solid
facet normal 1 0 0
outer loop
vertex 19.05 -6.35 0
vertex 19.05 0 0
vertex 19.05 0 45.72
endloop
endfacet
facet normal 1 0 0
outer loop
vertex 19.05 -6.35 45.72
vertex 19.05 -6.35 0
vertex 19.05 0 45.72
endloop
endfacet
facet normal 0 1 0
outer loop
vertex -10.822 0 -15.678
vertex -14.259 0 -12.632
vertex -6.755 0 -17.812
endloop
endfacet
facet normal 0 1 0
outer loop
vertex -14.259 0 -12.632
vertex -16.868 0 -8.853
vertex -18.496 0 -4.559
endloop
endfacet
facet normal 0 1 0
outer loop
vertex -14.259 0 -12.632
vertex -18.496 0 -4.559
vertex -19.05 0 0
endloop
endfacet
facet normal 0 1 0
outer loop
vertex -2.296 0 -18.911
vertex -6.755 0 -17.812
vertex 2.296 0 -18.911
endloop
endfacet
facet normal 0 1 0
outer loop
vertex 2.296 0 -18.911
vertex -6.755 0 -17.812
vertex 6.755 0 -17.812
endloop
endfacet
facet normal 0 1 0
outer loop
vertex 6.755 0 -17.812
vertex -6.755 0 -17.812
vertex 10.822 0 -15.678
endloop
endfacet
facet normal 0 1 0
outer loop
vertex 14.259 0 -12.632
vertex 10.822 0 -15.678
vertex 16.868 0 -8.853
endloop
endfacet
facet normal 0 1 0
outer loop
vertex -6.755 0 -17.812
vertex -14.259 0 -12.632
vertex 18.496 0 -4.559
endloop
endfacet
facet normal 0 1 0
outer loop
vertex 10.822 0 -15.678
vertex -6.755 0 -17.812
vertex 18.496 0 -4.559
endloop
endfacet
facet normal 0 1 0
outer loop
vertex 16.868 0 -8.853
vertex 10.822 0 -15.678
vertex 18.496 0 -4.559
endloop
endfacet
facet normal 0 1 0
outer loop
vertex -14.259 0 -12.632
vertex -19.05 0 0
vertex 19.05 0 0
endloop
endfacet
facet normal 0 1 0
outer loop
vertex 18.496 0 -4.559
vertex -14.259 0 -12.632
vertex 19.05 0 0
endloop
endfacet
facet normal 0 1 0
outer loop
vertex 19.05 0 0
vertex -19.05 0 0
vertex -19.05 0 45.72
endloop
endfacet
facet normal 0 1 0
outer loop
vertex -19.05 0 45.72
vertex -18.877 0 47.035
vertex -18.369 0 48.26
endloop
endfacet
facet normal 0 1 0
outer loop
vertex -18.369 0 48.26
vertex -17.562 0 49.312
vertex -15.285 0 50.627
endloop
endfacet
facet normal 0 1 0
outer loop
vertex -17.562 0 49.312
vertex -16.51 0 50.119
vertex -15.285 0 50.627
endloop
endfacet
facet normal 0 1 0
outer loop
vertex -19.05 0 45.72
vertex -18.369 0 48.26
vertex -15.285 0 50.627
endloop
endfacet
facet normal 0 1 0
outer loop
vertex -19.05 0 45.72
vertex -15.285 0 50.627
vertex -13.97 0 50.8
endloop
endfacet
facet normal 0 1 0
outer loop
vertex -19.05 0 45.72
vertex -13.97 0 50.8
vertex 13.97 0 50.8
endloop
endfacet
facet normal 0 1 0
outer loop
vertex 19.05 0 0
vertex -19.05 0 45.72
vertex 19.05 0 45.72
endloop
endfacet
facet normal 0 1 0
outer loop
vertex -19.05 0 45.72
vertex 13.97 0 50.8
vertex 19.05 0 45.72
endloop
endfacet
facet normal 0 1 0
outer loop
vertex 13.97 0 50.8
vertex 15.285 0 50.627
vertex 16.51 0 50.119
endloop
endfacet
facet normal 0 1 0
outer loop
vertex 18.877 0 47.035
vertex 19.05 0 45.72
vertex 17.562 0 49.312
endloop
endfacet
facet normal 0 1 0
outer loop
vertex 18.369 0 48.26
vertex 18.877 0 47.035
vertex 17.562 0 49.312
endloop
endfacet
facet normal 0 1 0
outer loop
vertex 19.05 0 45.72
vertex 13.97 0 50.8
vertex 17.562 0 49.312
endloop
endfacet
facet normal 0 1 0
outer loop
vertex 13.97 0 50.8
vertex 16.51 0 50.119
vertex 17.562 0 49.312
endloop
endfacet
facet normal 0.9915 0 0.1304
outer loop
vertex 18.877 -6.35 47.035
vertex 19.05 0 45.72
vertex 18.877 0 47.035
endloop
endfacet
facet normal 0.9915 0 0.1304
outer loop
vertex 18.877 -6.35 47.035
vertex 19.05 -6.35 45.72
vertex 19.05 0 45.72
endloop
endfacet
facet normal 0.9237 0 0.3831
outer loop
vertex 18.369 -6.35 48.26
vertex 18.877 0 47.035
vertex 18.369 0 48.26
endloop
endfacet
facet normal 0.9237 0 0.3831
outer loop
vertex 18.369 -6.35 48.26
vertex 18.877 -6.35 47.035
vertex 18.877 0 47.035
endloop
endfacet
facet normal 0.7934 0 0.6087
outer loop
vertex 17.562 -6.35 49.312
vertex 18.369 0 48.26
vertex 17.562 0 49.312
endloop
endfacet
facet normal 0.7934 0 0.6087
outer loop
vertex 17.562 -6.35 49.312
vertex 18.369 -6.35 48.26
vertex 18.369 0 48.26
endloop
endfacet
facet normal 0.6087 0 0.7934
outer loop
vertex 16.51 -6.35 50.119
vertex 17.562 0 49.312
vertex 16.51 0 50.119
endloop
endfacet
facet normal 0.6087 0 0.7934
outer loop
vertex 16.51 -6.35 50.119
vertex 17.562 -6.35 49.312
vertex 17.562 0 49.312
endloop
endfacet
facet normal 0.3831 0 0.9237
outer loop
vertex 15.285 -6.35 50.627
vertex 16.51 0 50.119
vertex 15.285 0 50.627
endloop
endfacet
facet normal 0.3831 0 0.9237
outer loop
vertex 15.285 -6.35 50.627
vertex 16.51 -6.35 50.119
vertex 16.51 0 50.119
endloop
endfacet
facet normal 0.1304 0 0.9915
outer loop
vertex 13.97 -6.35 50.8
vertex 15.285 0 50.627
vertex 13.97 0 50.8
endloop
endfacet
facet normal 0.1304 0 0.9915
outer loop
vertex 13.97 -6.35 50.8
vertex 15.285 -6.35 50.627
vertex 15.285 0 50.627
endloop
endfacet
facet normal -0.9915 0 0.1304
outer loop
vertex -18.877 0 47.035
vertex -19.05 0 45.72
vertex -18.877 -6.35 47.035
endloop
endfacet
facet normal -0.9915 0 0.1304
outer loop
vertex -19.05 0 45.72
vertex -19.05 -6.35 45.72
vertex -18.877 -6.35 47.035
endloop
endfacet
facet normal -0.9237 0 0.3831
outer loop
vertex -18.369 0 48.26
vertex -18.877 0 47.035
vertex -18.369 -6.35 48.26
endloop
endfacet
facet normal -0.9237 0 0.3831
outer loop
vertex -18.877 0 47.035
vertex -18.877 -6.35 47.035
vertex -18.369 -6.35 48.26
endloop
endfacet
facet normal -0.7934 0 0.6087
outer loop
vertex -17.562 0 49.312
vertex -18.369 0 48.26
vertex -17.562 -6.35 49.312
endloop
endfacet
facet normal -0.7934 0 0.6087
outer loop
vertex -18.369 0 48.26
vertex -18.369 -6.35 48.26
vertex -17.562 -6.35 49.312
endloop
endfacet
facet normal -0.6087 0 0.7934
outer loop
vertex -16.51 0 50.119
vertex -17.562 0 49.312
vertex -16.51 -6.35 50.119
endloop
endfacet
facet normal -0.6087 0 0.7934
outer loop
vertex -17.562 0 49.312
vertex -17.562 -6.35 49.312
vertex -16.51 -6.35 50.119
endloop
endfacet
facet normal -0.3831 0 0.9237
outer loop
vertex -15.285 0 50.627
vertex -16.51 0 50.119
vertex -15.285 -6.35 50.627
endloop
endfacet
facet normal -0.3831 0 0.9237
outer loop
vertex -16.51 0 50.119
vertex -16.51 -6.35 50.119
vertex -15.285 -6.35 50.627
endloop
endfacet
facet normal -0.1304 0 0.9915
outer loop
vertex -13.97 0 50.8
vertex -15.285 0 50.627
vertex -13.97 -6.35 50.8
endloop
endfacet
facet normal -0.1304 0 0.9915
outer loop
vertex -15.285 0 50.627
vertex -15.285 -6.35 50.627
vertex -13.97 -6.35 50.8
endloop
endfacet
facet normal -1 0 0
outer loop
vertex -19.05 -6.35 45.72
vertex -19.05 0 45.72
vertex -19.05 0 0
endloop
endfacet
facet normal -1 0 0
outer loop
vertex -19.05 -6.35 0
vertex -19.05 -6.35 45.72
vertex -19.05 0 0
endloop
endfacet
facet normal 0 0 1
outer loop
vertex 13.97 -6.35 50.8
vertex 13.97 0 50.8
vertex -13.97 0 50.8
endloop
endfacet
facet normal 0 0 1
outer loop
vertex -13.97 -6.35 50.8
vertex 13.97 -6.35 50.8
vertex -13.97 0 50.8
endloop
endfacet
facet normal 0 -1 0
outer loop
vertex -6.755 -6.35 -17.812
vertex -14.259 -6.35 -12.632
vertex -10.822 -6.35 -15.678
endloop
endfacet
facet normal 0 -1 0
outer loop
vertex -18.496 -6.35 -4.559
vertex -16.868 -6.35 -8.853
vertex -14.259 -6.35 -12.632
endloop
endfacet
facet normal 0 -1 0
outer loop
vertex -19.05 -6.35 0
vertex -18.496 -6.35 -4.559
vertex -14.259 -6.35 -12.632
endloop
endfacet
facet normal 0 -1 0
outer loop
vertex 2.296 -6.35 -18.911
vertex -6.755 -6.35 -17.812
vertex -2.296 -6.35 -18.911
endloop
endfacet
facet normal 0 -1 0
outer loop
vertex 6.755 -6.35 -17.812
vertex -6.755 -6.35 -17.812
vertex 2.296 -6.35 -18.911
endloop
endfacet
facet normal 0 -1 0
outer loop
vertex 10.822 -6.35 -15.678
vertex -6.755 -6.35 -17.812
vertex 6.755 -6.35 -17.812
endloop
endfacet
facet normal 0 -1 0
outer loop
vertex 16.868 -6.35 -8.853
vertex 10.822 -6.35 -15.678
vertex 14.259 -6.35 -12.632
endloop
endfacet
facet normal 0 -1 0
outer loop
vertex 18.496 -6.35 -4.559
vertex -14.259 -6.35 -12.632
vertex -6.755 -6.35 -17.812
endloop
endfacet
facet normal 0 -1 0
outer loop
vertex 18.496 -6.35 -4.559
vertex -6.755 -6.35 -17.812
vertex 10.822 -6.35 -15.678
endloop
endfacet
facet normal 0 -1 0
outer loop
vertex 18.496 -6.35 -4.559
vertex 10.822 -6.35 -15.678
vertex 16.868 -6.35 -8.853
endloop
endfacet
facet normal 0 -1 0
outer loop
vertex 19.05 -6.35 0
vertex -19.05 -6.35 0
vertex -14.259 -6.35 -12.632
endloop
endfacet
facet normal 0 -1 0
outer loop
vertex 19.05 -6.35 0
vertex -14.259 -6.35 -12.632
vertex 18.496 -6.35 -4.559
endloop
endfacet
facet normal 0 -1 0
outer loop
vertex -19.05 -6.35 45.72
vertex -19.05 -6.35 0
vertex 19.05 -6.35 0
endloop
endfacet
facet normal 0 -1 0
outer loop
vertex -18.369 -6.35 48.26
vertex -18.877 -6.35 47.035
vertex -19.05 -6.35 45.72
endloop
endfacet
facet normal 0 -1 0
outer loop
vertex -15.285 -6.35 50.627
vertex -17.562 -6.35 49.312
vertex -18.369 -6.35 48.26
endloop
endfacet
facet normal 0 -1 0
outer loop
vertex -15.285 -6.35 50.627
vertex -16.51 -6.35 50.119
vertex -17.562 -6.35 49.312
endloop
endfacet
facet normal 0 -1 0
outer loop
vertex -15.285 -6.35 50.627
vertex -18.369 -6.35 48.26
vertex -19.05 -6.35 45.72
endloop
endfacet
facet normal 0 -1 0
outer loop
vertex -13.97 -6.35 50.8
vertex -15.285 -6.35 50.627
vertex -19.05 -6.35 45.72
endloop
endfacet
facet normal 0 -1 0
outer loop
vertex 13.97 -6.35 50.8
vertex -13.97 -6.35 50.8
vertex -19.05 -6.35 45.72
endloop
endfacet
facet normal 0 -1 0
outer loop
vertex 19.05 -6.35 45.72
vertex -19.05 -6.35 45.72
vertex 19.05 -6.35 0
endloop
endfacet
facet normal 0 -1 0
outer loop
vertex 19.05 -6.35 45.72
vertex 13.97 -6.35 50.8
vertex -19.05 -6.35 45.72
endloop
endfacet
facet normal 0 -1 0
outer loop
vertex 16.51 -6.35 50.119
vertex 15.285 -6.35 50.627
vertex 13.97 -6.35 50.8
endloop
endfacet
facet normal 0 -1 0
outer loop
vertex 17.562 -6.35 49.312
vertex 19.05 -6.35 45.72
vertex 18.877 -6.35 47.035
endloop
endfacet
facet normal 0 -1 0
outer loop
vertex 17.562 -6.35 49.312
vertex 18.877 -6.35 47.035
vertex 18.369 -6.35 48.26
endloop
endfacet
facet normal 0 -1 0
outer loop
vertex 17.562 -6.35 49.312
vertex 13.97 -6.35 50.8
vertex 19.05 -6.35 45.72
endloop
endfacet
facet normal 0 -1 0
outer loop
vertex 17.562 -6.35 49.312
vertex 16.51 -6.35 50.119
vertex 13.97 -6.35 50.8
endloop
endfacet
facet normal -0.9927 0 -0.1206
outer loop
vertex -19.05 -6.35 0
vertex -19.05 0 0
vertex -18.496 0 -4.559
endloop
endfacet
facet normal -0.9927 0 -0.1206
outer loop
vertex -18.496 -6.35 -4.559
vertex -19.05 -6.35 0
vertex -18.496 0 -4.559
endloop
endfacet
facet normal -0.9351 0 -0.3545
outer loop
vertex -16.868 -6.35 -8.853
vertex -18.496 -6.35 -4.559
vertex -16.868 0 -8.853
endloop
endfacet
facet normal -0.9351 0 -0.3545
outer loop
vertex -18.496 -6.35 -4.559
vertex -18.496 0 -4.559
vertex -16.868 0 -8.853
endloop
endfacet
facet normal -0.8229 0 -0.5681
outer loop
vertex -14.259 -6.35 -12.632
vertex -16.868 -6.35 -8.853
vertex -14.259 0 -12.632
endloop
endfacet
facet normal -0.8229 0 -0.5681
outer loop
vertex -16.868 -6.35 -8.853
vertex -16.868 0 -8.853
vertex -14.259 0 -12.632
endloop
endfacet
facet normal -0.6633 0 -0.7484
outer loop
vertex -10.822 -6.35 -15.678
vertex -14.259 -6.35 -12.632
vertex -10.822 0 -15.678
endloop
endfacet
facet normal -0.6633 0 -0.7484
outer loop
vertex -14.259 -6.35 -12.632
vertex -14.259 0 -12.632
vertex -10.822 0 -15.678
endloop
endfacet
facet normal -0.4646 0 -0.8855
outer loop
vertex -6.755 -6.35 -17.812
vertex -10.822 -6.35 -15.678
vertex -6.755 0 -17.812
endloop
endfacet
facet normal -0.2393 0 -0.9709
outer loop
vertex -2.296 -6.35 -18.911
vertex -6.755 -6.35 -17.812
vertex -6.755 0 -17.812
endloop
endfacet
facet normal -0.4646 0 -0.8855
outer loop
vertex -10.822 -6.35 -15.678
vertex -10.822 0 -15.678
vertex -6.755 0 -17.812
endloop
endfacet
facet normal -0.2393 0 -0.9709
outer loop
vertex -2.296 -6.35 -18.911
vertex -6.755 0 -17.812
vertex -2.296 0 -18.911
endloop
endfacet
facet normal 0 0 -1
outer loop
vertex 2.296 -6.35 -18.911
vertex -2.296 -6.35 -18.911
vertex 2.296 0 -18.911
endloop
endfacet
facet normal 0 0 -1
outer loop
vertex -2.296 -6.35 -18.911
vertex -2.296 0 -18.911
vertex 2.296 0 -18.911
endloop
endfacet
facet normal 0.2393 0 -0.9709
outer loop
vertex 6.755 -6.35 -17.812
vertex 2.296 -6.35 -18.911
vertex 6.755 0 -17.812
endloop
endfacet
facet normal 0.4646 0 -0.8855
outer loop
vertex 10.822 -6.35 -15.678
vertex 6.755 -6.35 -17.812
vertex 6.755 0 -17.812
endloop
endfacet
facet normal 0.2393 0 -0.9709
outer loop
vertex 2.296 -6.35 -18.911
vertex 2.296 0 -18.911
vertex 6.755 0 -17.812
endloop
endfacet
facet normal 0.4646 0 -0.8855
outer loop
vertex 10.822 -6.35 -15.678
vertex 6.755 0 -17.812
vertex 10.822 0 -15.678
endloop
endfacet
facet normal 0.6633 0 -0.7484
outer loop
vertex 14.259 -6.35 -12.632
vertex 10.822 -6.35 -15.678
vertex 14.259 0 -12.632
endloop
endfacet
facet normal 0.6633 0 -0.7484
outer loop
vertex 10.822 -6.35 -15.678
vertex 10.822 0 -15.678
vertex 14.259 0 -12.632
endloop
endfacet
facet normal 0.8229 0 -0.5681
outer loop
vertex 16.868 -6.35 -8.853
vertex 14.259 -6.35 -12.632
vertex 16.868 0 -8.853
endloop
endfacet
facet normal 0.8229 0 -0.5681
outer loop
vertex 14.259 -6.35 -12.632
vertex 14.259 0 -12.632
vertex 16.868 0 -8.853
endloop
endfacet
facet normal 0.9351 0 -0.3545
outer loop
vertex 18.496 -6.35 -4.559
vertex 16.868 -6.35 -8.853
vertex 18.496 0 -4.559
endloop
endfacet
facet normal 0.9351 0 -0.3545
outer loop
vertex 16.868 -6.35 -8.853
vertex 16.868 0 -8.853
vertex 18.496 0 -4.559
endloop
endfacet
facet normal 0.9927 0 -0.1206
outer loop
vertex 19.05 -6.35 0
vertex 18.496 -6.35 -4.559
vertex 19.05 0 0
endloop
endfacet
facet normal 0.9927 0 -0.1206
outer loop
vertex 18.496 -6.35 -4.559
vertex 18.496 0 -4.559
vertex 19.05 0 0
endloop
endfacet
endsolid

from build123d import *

# Parameters (mm, degrees)
F1_DEPTH = 6.35
F2_R     = 5.08


with BuildPart() as f1:
    # F0 (on Front) → F1 (new body)
    with BuildSketch(Plane.XZ):
        with BuildLine():
            Line((-19.05, 50.8), (-19.05, 0))
            ThreePointArc((-19.05, 0), (0, -19.05), (19.05, 0))
            Line((19.05, 0), (19.05, 50.8))
            Line((19.05, 50.8), (-19.05, 50.8))
        make_face()
    extrude(amount=F1_DEPTH)

    # F2
    f2_edges = [f1.edges().sort_by_distance(p)[0] for p in [
        (19.05, -3.175, 50.8),
        (-19.05, -3.175, 50.8),
    ]]
    fillet(f2_edges, radius=F2_R)


solid = f1.part
